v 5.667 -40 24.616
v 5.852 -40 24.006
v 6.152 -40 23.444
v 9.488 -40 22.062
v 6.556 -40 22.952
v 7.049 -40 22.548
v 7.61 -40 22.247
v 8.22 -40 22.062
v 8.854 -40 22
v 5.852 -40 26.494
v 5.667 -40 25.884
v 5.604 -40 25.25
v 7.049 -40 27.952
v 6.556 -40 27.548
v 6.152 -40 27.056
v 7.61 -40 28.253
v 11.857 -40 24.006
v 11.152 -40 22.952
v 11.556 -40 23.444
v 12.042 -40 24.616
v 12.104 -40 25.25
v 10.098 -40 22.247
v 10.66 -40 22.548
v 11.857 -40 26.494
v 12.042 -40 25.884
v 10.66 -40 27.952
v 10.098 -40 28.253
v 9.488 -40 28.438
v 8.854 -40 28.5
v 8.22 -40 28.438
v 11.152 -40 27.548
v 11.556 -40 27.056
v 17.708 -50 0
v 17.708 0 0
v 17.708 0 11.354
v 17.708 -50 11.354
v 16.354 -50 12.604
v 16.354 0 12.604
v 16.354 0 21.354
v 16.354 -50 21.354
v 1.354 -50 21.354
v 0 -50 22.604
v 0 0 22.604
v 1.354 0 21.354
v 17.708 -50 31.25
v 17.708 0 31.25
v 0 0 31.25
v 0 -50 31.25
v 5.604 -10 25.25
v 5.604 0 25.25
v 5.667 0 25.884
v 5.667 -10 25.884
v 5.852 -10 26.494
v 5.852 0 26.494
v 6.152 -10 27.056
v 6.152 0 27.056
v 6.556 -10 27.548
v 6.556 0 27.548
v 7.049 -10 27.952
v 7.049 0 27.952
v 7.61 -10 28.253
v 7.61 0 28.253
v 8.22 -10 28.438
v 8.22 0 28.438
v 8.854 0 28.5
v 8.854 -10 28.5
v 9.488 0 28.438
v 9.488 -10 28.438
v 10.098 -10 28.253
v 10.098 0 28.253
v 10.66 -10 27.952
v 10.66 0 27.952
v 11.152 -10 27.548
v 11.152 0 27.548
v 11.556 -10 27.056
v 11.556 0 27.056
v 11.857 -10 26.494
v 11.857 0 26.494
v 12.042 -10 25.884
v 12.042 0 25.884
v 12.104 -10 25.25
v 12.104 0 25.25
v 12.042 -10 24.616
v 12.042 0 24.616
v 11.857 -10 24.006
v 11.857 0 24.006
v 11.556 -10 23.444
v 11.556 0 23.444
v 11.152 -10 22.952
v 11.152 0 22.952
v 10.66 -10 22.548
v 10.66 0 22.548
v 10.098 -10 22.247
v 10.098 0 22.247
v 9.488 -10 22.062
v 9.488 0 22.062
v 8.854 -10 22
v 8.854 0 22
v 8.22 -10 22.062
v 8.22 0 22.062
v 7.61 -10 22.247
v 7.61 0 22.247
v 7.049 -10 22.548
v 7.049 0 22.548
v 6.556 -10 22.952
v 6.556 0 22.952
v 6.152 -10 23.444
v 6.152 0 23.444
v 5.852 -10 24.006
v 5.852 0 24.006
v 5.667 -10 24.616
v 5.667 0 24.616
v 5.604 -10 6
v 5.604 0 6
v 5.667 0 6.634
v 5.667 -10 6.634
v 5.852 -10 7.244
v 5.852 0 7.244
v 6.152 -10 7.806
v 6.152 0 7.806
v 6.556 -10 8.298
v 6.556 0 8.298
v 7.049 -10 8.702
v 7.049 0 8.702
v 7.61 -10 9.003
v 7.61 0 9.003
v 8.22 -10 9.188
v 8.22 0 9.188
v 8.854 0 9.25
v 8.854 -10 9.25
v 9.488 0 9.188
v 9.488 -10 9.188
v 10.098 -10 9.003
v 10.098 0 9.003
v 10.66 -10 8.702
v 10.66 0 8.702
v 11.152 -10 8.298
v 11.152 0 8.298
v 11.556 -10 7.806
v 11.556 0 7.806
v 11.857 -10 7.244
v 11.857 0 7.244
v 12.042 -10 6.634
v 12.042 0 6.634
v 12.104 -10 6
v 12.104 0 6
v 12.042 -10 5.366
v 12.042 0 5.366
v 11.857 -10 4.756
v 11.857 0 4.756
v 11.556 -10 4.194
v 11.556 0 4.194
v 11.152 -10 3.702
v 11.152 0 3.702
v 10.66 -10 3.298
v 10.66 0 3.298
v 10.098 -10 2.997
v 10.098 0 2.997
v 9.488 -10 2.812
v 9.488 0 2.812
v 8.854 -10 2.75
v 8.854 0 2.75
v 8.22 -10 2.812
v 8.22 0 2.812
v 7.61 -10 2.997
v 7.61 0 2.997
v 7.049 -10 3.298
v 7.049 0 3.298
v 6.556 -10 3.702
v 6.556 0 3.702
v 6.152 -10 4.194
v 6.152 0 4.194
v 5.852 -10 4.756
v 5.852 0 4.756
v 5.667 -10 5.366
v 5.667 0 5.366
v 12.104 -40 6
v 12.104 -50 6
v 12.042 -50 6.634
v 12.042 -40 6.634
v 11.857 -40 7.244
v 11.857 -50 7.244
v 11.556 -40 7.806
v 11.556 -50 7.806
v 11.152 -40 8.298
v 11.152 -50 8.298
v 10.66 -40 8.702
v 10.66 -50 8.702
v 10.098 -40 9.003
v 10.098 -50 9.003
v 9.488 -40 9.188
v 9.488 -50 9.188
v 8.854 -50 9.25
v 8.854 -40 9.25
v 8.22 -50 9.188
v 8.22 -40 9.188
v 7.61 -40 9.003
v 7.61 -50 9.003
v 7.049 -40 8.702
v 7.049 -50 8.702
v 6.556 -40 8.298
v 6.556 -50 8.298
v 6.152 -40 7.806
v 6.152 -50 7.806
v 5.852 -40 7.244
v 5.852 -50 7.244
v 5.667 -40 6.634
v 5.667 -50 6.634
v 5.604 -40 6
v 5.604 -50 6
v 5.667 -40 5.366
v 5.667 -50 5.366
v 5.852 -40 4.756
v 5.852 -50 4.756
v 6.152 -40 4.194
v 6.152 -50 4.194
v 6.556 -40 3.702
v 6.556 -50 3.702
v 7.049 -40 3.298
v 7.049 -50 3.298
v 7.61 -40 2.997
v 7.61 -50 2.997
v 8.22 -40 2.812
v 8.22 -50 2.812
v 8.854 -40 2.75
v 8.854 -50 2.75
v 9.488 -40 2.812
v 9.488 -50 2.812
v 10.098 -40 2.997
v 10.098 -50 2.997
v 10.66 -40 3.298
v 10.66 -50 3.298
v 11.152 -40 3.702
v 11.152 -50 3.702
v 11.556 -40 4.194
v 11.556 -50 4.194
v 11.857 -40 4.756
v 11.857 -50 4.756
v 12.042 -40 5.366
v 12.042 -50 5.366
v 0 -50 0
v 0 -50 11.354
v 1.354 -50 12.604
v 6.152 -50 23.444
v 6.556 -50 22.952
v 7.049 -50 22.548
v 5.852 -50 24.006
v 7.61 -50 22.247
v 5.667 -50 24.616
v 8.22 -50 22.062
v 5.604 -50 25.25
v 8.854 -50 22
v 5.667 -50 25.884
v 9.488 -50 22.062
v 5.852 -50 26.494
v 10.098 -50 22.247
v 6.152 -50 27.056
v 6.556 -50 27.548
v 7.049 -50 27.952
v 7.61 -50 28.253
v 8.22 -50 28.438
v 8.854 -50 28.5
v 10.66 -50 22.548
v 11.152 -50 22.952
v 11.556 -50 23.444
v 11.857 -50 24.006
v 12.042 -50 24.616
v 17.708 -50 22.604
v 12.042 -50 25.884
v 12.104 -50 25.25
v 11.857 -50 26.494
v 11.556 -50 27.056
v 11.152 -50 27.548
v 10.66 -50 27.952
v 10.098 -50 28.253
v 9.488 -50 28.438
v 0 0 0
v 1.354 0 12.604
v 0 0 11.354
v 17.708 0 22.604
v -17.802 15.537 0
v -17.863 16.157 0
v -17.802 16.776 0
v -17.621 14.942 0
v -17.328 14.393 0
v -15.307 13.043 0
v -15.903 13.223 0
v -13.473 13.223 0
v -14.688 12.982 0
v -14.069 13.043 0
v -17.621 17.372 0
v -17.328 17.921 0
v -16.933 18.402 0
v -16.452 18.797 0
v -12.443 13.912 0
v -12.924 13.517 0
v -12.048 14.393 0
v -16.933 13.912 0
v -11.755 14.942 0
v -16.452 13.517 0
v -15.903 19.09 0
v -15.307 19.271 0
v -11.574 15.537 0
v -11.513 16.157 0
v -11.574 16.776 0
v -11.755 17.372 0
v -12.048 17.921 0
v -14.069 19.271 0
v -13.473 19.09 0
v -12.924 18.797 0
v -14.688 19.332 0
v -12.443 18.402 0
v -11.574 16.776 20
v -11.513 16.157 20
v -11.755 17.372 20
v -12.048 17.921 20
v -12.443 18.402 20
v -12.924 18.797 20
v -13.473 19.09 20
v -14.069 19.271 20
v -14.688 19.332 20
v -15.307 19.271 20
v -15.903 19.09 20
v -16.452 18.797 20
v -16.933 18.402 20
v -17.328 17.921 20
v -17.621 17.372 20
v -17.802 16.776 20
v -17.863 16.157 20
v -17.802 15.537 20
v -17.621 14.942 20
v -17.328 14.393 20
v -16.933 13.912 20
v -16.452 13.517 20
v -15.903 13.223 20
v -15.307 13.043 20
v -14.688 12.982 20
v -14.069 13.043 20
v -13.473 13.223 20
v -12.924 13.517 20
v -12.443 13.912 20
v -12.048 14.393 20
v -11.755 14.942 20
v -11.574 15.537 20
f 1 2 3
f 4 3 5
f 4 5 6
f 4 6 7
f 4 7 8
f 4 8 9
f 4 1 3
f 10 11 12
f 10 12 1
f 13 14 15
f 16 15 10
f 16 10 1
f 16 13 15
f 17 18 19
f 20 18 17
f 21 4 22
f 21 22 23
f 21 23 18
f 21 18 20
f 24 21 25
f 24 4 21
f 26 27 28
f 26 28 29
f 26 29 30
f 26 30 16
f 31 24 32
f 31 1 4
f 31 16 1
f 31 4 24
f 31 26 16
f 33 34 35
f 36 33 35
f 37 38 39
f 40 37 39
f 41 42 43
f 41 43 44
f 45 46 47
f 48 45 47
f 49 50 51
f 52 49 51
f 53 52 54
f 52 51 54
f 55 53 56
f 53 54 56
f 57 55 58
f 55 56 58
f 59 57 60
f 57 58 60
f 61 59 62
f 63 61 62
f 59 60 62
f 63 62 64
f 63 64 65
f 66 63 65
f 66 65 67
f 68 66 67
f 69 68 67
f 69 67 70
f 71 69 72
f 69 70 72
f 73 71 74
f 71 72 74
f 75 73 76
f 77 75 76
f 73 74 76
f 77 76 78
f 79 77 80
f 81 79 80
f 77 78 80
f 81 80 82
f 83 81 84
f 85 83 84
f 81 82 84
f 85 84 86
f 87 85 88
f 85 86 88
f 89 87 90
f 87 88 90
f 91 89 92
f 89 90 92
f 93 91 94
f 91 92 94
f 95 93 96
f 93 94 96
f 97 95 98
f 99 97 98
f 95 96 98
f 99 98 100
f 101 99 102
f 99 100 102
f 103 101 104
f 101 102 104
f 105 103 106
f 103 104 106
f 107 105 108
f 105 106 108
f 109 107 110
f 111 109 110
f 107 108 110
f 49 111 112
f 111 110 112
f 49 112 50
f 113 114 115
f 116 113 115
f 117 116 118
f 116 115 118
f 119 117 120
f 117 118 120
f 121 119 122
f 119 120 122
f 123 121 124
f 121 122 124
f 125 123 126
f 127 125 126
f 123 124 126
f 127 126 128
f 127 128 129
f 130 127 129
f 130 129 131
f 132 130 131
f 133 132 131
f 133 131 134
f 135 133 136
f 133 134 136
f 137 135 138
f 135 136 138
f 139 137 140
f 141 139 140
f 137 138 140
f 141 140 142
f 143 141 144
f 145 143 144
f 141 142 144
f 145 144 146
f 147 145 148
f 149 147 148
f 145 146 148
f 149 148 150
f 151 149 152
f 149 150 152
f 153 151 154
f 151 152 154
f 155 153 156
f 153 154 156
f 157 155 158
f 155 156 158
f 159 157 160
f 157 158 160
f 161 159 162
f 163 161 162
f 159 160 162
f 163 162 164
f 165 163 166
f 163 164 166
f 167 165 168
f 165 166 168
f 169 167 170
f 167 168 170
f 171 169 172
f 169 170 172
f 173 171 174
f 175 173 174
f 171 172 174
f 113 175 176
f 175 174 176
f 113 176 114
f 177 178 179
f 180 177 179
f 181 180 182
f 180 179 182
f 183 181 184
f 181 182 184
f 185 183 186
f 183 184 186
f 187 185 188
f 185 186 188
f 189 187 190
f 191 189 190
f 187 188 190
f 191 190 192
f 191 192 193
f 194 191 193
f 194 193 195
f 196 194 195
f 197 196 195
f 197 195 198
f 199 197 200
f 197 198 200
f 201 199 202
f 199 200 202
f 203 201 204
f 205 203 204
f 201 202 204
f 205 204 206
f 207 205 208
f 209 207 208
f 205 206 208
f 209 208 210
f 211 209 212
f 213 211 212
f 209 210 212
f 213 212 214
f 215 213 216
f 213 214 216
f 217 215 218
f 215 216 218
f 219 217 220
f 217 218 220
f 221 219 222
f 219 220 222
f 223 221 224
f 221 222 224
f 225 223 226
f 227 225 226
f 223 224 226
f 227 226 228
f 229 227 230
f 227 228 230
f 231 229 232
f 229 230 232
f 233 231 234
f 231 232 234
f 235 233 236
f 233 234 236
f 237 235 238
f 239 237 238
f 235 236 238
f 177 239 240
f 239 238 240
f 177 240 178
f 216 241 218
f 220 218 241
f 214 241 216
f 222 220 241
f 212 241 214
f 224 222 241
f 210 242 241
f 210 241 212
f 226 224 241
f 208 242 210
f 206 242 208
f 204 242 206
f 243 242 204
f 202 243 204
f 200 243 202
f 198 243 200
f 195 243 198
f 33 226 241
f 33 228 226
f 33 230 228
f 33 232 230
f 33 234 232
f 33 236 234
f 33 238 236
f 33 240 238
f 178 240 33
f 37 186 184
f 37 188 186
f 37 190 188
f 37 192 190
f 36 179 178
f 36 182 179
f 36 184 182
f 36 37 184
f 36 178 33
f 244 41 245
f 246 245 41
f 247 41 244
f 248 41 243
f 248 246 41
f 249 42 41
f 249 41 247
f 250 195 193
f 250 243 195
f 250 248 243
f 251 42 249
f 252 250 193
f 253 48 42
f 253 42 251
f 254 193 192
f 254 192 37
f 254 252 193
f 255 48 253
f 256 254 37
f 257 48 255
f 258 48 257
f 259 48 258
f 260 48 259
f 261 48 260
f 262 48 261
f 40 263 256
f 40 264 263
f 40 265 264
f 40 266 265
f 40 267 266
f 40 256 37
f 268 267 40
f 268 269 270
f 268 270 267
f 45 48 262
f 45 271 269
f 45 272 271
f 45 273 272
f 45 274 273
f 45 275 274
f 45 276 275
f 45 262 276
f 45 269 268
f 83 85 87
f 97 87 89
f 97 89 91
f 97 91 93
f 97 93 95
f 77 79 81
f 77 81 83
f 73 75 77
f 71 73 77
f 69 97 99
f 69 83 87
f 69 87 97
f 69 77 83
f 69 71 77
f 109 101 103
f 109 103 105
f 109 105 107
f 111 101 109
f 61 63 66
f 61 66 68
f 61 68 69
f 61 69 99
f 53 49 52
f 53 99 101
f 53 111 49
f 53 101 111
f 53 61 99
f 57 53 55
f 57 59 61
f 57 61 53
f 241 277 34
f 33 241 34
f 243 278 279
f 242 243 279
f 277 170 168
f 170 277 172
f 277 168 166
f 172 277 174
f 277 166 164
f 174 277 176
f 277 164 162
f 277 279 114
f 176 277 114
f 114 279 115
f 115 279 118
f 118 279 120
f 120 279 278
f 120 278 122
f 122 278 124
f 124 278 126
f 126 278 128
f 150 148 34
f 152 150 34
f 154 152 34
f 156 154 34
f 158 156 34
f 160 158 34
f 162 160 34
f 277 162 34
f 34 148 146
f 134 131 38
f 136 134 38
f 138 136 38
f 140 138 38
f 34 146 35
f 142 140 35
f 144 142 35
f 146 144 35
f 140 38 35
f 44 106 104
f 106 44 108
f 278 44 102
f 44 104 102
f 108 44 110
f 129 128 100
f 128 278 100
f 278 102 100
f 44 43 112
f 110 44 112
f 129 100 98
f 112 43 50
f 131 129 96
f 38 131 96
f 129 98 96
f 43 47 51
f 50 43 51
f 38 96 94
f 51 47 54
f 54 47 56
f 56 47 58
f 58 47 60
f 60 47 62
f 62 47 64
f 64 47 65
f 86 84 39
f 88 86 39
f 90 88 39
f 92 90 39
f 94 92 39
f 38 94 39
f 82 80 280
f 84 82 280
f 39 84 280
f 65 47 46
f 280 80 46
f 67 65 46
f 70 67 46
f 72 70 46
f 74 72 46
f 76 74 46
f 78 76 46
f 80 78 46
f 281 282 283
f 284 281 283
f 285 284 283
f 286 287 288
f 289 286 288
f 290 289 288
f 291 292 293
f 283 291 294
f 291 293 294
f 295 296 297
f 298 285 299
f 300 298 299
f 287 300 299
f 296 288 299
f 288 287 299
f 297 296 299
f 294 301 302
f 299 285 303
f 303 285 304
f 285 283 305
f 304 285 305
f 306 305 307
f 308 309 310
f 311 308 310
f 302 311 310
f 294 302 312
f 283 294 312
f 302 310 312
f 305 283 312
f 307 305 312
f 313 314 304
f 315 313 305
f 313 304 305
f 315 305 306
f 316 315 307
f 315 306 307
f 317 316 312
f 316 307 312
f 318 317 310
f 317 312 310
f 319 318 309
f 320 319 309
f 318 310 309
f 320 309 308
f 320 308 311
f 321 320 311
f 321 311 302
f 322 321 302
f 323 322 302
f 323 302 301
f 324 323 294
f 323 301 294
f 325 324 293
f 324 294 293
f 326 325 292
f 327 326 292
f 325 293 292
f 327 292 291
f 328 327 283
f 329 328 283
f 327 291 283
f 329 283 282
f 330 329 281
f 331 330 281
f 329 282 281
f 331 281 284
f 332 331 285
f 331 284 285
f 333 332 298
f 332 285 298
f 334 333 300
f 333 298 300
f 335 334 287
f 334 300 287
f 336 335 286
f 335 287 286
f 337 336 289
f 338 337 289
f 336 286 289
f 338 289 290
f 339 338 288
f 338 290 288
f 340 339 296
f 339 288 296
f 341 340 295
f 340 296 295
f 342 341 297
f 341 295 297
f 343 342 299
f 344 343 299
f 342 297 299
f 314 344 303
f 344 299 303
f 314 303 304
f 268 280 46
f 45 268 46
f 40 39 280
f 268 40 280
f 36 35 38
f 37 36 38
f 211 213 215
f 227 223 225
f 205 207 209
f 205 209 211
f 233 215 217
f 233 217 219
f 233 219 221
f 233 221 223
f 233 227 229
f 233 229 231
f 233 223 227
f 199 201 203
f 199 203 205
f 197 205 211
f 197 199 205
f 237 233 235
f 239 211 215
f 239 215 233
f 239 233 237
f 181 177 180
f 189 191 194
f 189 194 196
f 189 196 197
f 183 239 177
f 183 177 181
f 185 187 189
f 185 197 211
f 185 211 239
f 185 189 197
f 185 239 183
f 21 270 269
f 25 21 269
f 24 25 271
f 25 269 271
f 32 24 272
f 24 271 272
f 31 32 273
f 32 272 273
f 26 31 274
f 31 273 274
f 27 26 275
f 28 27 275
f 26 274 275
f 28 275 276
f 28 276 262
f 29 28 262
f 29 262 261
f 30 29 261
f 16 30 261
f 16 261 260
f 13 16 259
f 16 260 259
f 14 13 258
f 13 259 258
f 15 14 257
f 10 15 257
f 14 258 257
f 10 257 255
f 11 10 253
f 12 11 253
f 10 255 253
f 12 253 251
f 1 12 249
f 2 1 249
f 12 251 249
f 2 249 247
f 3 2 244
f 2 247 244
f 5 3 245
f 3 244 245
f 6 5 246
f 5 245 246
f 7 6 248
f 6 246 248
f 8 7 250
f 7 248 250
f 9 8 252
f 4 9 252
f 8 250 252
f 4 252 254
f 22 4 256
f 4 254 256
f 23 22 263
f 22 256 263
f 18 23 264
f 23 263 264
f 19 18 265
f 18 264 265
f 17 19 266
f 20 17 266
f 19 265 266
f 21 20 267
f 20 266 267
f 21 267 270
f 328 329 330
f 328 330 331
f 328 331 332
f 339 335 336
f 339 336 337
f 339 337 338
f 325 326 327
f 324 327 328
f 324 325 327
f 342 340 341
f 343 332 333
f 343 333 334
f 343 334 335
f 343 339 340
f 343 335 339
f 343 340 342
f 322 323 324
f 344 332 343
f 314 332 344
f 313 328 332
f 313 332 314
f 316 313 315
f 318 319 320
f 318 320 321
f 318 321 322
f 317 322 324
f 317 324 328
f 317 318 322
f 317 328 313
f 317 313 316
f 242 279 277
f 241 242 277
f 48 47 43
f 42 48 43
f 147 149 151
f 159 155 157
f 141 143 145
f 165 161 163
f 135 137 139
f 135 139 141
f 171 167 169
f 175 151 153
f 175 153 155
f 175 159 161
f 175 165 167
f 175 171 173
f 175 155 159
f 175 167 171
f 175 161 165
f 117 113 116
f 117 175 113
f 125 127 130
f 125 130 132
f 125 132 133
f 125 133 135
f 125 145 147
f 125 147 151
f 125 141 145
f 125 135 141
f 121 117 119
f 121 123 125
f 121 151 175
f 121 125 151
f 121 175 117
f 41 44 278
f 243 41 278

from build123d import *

# Parameters (mm, degrees)
F1_DEPTH = 50
F2_R     = 3.25
F3_DEPTH = 10
F4_R     = 3.25
F5_DEPTH = 10
F6_R     = 3.175
F7_DEPTH = 20


with BuildPart() as f1:
    # F0 (on Front) → F1 (new body)
    with BuildSketch(Plane.XZ):
        Polygon((0, 0), (8.854167, 0), (17.708333, 0), (17.708333, 11.354167), (16.354167, 12.604167), (16.354167, 21.354167), (17.708333, 22.604167), (17.708333, 31.25), (8.854167, 31.25), (0, 31.25), (0, 22.604167), (1.354167, 21.354167), (1.354167, 12.604167), (0, 11.354167), align=None)
    extrude(amount=F1_DEPTH)

    # F2 (on face) → F3 (cut)
    with BuildSketch(Plane.XZ.offset(50)):
        with Locations((8.854167, 6)):
            Circle(F2_R)
        with Locations((8.854167, 25.25)):
            Circle(F2_R)
    extrude(amount=-F3_DEPTH, mode=Mode.SUBTRACT)

    # F4 (on face) → F5 (cut)
    with BuildSketch(Plane(origin=(0, 0, 0), x_dir=(-1, 0, 0), z_dir=(0, 1, 0))):
        with Locations((-8.854167, 6)):
            Circle(F4_R)
        with Locations((-8.854167, 25.25)):
            Circle(F4_R)
    extrude(amount=-F5_DEPTH, mode=Mode.SUBTRACT)


with BuildPart() as f7:
    # F6 (on Top) → F7 (new body)
    with BuildSketch(Plane.XY):
        with Locations((-14.687948, 16.156744)):
            Circle(F6_R)
    extrude(amount=F7_DEPTH)


solid = Compound([f1.part, f7.part])
